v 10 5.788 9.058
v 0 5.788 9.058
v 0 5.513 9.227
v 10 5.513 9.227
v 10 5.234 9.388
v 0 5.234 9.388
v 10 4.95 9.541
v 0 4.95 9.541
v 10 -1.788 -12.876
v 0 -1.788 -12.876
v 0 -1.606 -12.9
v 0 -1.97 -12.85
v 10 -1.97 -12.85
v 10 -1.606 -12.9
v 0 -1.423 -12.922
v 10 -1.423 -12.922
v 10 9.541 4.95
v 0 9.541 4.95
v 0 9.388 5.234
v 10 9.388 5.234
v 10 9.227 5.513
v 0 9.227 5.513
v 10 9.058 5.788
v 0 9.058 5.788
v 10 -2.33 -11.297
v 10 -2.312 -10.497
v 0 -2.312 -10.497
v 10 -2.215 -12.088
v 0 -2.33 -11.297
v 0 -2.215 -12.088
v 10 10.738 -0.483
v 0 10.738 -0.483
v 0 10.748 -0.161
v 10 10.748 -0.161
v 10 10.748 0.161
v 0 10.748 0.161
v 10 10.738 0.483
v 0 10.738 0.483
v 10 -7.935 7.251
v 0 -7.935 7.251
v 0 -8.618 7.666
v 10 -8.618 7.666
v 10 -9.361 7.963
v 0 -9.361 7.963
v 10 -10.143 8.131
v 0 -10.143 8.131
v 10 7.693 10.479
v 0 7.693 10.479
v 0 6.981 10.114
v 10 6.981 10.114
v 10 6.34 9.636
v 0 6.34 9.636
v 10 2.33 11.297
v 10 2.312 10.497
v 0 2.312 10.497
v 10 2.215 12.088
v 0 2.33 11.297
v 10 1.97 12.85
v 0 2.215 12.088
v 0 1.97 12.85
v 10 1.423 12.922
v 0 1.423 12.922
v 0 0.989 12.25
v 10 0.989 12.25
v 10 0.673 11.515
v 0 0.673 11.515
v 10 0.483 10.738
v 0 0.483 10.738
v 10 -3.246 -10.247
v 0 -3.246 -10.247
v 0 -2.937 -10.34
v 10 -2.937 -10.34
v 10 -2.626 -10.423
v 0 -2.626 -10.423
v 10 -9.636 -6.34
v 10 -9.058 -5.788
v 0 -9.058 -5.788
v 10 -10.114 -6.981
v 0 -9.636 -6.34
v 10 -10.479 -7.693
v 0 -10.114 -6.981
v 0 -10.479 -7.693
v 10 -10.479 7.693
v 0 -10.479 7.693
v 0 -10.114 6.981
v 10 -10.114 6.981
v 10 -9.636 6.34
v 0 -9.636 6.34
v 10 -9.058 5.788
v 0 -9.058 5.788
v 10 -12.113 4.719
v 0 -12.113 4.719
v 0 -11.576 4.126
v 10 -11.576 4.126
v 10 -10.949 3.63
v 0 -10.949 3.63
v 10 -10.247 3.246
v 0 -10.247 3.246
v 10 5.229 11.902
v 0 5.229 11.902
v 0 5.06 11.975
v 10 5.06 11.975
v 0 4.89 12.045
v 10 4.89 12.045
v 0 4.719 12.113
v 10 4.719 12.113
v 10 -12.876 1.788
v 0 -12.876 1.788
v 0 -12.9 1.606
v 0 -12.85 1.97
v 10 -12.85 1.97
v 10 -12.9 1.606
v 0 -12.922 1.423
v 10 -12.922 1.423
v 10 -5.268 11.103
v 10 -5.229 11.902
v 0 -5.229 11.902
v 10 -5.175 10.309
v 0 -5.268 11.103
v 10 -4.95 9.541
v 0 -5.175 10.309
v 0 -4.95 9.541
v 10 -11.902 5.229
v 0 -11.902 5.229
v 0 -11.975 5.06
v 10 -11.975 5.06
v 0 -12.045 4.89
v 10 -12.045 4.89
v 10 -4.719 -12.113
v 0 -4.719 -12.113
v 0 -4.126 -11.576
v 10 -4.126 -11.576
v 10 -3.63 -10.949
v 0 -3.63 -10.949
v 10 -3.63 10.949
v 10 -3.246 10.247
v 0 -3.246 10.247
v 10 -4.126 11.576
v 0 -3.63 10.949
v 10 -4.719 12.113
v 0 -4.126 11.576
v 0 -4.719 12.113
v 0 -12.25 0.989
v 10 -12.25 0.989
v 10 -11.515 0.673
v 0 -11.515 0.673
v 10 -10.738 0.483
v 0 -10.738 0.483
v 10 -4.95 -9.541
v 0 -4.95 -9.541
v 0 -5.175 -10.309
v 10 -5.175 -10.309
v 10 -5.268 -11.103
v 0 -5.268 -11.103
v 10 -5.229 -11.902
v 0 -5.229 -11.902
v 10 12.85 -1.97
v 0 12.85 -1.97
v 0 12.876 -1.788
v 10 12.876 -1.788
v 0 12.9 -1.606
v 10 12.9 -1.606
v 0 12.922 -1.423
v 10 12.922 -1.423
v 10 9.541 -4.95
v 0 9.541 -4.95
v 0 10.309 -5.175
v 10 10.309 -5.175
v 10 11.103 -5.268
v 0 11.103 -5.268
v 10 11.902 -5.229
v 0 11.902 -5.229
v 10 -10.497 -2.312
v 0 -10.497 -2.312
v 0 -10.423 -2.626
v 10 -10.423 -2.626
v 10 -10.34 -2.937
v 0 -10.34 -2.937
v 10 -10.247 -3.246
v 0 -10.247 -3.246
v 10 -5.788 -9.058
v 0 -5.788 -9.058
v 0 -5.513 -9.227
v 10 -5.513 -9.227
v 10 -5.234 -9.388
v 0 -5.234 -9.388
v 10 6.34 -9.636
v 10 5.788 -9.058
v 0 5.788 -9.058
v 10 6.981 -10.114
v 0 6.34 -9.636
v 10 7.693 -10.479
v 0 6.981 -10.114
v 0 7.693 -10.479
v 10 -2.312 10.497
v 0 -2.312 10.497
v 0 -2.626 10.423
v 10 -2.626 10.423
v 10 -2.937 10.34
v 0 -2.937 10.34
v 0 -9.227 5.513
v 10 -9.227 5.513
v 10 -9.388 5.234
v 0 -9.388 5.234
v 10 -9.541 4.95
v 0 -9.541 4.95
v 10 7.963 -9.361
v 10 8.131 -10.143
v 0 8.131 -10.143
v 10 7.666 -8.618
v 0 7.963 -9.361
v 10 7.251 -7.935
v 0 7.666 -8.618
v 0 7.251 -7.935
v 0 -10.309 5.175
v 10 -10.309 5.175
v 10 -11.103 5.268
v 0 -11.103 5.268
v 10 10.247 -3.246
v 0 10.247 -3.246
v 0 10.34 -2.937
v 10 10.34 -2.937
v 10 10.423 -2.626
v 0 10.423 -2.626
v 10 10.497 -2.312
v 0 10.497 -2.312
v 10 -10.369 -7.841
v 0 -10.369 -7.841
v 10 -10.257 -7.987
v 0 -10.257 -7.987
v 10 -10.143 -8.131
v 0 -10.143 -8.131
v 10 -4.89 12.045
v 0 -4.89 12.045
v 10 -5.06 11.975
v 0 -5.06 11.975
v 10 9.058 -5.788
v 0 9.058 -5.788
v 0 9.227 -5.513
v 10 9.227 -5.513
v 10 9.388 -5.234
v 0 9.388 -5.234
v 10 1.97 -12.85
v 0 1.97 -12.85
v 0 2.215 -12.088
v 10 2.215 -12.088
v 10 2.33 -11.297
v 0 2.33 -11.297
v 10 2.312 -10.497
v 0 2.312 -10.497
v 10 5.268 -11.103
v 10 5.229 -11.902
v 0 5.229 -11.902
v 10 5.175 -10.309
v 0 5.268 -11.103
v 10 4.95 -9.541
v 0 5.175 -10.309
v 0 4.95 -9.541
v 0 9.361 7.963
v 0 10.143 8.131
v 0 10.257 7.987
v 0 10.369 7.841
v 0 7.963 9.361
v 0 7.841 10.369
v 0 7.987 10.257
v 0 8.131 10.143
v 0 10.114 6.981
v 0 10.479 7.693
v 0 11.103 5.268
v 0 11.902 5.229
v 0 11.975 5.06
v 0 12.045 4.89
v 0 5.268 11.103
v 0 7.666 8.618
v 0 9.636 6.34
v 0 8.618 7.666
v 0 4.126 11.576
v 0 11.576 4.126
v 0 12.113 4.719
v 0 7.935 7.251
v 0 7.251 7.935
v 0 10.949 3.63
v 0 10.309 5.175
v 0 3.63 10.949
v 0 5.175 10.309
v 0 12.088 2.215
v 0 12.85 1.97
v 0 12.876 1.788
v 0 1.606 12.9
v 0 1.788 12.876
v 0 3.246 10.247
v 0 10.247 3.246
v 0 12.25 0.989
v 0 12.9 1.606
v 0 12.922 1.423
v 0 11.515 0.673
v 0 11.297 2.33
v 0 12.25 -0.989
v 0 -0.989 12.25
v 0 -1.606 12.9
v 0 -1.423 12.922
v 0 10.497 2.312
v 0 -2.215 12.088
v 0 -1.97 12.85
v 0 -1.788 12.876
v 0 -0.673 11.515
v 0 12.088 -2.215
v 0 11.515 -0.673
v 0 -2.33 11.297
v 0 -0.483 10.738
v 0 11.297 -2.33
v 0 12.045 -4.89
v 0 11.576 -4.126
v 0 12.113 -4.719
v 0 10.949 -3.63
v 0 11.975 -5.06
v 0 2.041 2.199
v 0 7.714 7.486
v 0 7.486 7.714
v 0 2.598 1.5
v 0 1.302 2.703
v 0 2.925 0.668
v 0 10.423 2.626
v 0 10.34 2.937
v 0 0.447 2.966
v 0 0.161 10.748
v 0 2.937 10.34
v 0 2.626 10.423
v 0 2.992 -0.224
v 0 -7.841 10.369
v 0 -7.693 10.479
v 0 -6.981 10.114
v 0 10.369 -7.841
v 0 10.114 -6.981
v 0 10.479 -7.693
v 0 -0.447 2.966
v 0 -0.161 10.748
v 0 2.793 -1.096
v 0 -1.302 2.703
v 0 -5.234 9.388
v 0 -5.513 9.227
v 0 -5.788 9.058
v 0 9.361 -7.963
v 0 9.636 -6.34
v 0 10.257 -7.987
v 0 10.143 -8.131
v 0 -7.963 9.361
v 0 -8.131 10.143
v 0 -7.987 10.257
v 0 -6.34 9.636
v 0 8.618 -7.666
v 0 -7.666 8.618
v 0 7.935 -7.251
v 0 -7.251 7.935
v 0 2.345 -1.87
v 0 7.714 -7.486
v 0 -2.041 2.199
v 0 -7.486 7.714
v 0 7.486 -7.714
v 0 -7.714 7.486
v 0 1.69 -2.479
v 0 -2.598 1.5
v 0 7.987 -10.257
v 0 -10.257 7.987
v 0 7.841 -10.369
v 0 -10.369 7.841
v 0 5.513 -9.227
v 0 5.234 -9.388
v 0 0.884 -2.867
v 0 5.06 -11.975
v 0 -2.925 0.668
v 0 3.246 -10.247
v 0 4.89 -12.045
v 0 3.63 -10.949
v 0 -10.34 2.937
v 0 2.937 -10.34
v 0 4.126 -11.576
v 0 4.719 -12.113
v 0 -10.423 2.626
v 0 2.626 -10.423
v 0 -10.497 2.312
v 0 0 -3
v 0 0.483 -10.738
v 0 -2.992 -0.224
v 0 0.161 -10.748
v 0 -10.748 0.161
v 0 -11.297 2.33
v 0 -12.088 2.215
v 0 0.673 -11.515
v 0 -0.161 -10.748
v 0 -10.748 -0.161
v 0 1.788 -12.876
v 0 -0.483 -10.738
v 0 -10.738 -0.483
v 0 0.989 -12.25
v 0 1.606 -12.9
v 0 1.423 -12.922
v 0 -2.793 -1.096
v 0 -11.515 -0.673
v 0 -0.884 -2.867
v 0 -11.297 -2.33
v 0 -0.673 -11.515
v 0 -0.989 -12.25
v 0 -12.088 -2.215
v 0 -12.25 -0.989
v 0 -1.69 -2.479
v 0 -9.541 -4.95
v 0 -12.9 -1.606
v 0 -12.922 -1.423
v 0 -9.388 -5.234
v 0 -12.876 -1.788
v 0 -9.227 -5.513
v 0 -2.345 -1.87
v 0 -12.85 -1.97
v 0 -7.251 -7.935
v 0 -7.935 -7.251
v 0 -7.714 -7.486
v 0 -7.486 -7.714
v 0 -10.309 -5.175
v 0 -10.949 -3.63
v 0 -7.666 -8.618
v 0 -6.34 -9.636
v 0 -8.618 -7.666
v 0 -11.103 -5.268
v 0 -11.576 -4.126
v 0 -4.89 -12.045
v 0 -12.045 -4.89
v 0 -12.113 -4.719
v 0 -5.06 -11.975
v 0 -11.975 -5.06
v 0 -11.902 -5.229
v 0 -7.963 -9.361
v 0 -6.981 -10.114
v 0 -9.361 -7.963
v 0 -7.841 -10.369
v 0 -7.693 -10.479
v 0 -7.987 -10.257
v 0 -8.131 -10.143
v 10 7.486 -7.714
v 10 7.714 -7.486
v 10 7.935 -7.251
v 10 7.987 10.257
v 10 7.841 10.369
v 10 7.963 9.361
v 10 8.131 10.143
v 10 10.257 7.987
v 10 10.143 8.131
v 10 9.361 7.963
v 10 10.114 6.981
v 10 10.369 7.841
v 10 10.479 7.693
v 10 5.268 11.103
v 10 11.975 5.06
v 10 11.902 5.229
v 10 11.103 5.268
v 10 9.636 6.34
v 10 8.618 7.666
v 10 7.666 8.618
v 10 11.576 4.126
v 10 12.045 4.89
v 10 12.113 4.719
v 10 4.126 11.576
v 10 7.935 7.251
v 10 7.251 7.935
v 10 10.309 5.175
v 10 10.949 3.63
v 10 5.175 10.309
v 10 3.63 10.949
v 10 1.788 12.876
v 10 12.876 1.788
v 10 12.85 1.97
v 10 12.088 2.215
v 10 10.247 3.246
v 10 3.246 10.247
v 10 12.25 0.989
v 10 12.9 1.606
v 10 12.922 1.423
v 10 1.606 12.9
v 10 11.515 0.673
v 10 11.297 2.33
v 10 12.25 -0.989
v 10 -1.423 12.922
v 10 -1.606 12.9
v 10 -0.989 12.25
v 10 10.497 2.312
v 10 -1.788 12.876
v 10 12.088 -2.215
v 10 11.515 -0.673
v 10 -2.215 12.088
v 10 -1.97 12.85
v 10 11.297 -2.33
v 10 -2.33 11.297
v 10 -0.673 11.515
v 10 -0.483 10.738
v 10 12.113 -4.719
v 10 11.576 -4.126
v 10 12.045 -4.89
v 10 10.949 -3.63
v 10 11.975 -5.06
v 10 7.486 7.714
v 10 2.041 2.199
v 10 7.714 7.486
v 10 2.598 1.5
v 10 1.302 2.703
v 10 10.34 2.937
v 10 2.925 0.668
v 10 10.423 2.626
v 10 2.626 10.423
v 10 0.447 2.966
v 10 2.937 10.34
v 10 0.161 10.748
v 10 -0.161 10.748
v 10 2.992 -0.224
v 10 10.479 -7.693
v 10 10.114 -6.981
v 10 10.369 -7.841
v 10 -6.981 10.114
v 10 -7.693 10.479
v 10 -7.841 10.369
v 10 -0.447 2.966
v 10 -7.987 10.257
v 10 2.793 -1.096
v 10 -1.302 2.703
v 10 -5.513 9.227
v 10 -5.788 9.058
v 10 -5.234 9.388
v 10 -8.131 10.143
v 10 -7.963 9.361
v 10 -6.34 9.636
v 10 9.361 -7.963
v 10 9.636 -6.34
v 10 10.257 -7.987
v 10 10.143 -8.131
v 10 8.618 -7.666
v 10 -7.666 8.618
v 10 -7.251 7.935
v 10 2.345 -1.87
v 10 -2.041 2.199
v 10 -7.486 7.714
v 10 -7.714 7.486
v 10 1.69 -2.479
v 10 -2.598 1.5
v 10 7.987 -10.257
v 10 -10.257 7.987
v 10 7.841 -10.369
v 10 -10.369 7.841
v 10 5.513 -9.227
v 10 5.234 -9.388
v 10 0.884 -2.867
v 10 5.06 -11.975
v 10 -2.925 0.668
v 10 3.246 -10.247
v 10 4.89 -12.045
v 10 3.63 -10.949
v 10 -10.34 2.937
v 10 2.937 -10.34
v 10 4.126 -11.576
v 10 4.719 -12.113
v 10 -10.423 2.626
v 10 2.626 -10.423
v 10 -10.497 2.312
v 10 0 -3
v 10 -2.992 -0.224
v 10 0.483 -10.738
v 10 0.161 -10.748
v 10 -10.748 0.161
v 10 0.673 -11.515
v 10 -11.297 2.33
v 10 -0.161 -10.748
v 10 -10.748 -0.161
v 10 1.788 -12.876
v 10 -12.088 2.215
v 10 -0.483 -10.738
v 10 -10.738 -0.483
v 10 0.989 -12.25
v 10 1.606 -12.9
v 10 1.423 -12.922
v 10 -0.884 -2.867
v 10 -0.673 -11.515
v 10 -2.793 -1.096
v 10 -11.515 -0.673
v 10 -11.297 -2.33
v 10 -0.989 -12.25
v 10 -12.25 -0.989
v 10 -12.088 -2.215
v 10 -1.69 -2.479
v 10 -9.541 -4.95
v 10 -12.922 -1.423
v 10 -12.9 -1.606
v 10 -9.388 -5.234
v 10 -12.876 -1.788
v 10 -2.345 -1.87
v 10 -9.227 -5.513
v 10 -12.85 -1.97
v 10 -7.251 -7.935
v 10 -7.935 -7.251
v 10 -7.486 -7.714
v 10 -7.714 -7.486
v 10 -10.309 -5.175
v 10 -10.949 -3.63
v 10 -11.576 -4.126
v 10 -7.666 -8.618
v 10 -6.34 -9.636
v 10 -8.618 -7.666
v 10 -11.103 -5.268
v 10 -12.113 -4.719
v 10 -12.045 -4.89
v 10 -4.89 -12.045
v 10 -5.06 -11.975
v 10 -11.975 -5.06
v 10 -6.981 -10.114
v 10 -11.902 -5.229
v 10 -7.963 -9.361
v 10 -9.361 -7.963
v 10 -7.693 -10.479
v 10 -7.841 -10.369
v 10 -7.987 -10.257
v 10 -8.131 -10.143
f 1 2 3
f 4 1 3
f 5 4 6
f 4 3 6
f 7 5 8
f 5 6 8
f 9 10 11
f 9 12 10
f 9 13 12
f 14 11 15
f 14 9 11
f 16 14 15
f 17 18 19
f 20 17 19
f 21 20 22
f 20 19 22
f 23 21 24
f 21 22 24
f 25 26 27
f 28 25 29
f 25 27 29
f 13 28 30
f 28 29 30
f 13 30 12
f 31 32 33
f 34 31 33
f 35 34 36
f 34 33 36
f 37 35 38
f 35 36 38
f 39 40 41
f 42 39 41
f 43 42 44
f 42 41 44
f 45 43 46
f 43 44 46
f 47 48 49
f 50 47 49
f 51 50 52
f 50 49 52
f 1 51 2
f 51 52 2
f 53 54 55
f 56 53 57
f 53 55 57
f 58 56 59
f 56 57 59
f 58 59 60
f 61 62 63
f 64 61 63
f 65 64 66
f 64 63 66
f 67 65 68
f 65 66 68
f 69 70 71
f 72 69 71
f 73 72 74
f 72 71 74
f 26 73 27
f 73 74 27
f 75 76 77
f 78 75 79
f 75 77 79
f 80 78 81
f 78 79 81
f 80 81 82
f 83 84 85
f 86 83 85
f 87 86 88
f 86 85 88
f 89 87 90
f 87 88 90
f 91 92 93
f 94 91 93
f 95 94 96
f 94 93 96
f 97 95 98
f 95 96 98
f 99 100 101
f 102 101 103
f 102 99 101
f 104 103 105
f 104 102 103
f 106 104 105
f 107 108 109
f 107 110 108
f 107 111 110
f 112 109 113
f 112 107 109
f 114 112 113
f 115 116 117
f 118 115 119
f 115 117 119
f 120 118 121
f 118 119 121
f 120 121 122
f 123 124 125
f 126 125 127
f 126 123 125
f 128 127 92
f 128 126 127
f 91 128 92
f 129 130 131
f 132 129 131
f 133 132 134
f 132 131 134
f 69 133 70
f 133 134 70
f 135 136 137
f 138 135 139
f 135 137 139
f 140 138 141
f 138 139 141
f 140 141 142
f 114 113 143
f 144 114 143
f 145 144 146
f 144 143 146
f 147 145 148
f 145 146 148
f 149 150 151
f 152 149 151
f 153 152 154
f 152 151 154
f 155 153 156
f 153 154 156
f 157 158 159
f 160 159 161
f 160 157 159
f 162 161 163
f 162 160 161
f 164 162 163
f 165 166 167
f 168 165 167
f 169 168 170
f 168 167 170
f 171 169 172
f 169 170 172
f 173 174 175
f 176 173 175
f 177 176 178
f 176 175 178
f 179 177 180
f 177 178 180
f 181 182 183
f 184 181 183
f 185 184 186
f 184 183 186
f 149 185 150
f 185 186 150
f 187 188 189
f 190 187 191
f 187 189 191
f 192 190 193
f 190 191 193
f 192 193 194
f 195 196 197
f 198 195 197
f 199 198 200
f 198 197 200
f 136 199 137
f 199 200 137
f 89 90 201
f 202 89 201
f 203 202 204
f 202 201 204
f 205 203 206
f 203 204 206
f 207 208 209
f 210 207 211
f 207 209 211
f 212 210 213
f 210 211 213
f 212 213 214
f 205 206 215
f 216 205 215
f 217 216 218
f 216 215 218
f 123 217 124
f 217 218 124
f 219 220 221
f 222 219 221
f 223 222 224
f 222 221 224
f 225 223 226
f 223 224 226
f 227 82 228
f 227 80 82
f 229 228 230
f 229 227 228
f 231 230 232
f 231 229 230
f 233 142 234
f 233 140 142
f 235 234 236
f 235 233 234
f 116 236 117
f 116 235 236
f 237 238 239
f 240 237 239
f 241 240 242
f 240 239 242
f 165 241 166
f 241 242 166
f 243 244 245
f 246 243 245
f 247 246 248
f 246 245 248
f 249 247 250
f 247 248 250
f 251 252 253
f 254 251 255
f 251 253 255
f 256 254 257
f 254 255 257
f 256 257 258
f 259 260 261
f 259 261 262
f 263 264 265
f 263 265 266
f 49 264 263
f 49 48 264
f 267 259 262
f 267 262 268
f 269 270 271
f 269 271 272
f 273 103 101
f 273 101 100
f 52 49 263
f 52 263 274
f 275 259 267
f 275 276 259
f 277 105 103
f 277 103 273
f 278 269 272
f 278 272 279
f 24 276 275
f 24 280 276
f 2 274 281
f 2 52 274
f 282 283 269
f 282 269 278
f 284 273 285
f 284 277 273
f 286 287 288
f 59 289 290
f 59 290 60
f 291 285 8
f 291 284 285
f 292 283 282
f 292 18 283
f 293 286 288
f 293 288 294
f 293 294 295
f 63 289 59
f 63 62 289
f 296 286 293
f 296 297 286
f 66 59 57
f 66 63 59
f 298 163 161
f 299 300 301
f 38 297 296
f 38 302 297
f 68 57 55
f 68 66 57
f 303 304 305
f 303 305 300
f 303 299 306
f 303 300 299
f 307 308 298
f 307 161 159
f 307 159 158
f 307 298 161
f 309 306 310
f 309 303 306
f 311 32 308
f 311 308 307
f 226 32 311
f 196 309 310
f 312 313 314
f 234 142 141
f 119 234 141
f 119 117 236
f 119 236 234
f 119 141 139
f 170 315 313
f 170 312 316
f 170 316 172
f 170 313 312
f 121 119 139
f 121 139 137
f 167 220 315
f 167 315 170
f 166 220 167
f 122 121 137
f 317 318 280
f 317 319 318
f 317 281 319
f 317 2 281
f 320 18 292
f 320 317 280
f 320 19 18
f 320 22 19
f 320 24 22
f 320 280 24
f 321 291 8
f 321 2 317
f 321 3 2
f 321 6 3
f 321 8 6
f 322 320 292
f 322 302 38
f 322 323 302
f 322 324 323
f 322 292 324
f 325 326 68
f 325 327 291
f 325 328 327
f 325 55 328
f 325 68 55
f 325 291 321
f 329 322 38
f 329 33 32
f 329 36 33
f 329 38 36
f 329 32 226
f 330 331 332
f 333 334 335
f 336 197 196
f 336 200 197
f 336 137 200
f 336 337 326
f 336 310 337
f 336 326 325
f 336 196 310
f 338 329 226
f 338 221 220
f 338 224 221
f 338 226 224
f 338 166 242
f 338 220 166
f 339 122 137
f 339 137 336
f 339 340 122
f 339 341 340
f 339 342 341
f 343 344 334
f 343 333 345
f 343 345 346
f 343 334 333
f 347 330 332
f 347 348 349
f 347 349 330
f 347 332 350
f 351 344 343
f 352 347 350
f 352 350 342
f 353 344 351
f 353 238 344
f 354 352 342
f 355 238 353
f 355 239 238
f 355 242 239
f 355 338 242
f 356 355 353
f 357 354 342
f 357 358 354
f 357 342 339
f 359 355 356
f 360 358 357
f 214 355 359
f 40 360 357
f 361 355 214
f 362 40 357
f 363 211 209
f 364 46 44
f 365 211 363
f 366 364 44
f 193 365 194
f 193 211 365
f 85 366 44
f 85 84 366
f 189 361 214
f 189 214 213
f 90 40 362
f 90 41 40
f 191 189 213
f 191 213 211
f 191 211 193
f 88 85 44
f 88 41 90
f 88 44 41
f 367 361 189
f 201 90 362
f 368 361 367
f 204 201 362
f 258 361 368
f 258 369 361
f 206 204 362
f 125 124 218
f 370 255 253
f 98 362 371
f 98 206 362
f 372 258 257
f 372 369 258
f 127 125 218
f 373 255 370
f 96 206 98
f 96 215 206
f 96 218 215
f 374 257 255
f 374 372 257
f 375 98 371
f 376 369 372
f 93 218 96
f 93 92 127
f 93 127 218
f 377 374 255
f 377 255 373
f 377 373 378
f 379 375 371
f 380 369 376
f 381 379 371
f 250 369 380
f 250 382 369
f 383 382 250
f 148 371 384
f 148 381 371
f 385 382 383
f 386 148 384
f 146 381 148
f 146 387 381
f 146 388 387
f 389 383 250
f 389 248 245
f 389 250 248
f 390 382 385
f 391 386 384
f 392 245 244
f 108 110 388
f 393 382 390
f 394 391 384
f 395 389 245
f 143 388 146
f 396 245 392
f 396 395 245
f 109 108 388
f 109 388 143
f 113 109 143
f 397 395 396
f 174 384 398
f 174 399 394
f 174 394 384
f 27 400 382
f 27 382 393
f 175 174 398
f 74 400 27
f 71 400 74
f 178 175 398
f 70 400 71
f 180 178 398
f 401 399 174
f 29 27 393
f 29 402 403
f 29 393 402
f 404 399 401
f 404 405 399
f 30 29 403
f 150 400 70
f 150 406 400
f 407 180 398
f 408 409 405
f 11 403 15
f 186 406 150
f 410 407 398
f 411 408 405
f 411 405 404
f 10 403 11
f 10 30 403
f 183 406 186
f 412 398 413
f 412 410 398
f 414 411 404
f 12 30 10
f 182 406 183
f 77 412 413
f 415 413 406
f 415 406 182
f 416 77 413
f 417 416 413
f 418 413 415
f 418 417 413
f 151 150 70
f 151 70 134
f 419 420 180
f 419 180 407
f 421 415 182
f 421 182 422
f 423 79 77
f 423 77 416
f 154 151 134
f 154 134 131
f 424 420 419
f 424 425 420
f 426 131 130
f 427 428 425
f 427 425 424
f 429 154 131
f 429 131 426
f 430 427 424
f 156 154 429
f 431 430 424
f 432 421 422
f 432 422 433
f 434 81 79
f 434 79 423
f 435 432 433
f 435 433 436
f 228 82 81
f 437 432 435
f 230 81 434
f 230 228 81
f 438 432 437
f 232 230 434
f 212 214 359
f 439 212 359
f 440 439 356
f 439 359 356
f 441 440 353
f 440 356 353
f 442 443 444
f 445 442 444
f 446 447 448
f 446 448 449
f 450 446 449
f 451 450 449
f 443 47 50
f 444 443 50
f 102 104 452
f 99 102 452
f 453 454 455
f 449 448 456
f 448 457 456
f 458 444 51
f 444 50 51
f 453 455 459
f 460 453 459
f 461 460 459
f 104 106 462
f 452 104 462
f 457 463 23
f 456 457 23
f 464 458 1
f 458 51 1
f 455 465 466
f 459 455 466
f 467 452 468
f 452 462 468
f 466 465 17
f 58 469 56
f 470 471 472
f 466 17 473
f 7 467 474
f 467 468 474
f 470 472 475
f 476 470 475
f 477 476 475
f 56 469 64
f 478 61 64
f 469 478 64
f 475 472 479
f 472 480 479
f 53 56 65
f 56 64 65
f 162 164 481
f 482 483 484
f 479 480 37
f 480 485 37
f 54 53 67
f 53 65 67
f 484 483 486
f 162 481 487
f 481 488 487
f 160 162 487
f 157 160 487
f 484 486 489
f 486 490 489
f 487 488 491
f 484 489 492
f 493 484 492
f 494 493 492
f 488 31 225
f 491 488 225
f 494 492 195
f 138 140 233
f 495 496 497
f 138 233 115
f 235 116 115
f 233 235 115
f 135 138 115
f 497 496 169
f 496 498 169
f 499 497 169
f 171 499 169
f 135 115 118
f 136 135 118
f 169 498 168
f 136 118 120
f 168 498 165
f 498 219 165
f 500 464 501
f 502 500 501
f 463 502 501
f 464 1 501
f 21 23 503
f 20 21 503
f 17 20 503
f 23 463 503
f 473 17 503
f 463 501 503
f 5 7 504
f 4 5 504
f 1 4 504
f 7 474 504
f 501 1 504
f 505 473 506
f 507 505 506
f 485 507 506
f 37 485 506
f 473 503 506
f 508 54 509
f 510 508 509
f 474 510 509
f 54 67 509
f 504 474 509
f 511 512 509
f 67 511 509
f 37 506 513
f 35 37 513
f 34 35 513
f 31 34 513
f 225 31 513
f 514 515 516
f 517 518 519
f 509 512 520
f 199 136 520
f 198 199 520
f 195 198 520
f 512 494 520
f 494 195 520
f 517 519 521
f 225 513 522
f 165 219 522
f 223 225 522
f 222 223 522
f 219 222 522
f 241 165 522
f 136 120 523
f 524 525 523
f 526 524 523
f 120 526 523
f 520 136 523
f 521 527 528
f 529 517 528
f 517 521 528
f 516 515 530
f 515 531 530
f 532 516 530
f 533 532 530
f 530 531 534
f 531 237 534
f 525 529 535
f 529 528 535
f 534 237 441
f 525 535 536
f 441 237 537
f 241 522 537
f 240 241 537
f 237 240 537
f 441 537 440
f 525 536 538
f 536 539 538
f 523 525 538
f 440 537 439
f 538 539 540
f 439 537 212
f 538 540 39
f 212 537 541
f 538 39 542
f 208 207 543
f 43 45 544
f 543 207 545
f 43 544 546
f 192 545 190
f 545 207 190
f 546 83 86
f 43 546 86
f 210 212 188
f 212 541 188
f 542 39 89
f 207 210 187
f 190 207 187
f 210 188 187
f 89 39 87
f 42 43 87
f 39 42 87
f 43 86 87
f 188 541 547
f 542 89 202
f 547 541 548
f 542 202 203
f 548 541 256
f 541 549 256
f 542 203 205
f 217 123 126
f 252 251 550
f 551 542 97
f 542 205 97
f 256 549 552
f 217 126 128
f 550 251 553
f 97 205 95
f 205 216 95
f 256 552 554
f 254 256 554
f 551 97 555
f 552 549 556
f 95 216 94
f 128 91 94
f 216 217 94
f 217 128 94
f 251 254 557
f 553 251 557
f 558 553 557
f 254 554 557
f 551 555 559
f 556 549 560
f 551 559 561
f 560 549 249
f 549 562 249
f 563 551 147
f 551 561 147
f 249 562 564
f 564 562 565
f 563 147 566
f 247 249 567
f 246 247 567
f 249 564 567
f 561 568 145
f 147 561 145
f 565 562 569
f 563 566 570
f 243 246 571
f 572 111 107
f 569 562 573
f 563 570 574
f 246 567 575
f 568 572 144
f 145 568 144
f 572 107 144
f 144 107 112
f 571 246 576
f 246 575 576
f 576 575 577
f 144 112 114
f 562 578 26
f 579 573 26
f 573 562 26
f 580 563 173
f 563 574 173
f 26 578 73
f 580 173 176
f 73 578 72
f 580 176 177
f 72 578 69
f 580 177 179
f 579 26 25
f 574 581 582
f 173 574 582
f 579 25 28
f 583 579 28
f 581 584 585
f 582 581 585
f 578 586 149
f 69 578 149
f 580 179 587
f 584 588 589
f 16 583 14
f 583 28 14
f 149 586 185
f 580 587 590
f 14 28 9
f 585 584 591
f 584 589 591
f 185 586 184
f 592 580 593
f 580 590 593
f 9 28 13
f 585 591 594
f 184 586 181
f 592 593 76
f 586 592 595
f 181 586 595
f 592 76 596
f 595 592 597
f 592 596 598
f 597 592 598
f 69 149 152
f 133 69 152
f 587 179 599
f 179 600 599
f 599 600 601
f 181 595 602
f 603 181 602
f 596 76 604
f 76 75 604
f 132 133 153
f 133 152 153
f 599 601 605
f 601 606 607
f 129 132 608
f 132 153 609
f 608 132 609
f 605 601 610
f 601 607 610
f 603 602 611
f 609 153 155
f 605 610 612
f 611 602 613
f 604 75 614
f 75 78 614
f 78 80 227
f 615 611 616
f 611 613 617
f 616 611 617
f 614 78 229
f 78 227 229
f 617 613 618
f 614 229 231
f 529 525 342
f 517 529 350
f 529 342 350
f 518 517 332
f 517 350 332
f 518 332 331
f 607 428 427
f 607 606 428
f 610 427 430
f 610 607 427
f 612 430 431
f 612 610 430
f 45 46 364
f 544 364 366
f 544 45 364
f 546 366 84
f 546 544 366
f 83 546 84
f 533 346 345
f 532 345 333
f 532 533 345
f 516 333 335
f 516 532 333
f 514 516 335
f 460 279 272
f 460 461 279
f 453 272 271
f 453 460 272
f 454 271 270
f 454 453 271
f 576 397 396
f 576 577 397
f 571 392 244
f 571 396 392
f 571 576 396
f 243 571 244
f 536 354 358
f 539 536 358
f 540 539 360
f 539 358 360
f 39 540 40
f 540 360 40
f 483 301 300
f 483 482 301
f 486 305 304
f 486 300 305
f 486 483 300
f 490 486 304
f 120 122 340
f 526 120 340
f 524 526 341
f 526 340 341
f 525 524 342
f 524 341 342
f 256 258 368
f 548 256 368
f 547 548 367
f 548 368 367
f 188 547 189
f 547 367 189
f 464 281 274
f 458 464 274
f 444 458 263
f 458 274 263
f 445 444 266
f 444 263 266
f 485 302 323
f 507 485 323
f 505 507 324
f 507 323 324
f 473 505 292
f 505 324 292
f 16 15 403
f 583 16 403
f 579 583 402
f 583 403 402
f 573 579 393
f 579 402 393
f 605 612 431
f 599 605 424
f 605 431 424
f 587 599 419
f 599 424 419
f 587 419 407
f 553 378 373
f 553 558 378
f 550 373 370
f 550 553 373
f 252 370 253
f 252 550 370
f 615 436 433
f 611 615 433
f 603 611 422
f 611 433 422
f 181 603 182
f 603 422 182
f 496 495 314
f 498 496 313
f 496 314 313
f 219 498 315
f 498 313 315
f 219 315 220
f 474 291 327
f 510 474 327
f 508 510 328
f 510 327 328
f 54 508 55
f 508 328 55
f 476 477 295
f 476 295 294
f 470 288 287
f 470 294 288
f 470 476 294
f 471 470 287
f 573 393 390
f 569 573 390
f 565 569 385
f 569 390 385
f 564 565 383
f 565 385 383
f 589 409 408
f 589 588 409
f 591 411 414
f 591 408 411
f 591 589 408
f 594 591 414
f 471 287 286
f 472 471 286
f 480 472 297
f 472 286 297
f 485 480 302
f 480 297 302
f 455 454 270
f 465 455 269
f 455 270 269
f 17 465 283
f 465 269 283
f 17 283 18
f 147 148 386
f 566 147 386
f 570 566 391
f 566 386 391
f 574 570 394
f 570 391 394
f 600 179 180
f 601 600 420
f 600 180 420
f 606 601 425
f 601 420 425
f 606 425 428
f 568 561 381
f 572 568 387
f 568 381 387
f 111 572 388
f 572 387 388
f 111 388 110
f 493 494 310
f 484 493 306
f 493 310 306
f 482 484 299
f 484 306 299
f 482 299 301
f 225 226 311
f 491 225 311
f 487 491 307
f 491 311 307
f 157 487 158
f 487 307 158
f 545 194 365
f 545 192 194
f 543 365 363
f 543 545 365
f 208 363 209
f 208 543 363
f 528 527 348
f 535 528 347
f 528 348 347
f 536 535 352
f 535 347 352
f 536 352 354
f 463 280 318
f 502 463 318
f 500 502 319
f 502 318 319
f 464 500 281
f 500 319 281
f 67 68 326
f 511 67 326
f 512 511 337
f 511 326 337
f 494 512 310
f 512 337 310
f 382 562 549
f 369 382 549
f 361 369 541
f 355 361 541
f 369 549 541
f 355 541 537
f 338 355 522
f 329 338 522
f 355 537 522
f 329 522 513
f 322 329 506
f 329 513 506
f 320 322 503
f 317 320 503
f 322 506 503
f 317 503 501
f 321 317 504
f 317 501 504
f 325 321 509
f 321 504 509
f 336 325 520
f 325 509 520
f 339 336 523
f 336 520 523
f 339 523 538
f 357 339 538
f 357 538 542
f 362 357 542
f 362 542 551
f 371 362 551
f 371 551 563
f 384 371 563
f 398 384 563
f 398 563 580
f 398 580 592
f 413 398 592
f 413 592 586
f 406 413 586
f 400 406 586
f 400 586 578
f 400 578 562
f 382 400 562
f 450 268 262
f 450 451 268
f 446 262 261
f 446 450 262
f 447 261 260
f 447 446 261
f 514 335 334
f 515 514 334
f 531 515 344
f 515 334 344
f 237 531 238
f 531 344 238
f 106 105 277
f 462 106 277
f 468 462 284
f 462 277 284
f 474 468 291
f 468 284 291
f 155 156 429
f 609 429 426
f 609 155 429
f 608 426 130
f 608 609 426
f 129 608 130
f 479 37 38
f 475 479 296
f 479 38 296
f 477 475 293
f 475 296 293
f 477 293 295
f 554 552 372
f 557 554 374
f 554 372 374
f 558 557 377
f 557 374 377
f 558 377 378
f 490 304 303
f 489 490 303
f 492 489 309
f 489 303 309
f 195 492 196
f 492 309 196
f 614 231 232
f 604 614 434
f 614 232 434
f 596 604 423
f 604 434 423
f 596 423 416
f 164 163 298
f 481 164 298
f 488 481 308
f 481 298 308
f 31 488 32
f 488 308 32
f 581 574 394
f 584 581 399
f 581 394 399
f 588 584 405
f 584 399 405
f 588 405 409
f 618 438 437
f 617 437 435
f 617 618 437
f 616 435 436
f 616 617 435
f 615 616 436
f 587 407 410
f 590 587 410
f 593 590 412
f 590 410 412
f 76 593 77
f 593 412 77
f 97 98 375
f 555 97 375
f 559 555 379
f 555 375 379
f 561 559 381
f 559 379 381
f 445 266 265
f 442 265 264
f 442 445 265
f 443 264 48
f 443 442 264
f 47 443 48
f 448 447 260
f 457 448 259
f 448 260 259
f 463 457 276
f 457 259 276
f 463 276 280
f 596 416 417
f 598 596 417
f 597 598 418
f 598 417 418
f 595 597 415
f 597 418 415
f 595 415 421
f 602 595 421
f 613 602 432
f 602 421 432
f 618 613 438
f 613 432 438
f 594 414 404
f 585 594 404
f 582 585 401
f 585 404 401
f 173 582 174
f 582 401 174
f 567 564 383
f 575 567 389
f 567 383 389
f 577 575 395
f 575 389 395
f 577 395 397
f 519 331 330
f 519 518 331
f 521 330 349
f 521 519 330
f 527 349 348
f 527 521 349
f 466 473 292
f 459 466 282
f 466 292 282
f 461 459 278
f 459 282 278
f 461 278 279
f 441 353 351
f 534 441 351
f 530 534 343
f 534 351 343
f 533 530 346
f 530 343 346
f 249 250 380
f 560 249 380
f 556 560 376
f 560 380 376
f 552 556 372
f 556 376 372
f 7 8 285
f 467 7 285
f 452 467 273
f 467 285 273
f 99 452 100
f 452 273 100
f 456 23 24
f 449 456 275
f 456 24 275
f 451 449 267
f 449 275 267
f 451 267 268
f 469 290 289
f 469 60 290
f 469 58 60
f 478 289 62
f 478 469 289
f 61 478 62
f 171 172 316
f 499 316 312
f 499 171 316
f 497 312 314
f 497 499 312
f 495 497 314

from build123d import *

# Parameters (mm, degrees)
BASPROSKE_W        = 10
BASPROSKE_H        = 13
TOOTHCUT_DEPTH     = 21.928449536
TEETHCUTS_COUNT    = 24
TEETHCUTS_ANGLE    = 345
BORSKE_R           = 2.5
BORE_DEPTH         = 50.0000508
SKETCH1_R          = 3
CUT_EXTRUDE1_DEPTH = 21.83151436


with BuildPart() as part:
    # BasProSke → Base-Revolve (revolve)
    with BuildSketch(Plane(origin=(0, 0, 0), x_dir=(1, 0, 0), z_dir=(0, 1, 0)), mode=Mode.PRIVATE) as base_revolve_sk:
        with Locations((5, 6.5)):
            Rectangle(BASPROSKE_W, BASPROSKE_H)
    revolve(base_revolve_sk.sketch.rotate(Axis((-10, 0, 0), (1, 0, 0)), 180), axis=Axis((-10, 0, 0), (1, 0, 0)))

    # TooCutSke → ToothCut (cut, through all)
    with BuildSketch(Plane(origin=(0, 0, 0), x_dir=(0, 0, -1), z_dir=(1, 0, 0))):
        with BuildLine():
            ThreePointArc((0.483448384, 10.738122679), (0, 10.749), (-0.483448384, 10.738122679))
            ThreePointArc((-0.483448384, 10.738122679), (-0.821636462, 11.902754369), (-1.44092227, 12.945454344))
            ThreePointArc((-1.44092227, 12.945454344), (0, 13.0254), (1.44092227, 12.945454344))
            ThreePointArc((1.44092227, 12.945454344), (0.821636462, 11.902754369), (0.483448384, 10.738122679))
        make_face()
    toothcut = extrude(amount=TOOTHCUT_DEPTH, mode=Mode.SUBTRACT)

    # TeethCuts: ToothCut ×24 about axis
    teethcuts_axis = Axis((-10, 0, 0), (1, 0, 0))
    for i in range(1, TEETHCUTS_COUNT):
        add(toothcut.rotate(teethcuts_axis, i * TEETHCUTS_ANGLE / (TEETHCUTS_COUNT - 1)), mode=Mode.SUBTRACT)

    # BorSke → Bore (cut, symmetric)
    with BuildSketch(Plane(origin=(0, 0, 0), x_dir=(0, 0, -1), z_dir=(1, 0, 0))):
        with Locations(Location((0, 0, 0), (0, 0, 180))):
            Circle(BORSKE_R)
    extrude(amount=BORE_DEPTH, both=True, mode=Mode.SUBTRACT)

    # Sketch1 → Cut-Extrude1 (cut, through all)
    with BuildSketch(Plane(origin=(10, 0, 0), x_dir=(0, 0, -1), z_dir=(1, 0, 0))):
        Circle(SKETCH1_R)
    extrude(amount=-CUT_EXTRUDE1_DEPTH, mode=Mode.SUBTRACT)


solid = part.part
